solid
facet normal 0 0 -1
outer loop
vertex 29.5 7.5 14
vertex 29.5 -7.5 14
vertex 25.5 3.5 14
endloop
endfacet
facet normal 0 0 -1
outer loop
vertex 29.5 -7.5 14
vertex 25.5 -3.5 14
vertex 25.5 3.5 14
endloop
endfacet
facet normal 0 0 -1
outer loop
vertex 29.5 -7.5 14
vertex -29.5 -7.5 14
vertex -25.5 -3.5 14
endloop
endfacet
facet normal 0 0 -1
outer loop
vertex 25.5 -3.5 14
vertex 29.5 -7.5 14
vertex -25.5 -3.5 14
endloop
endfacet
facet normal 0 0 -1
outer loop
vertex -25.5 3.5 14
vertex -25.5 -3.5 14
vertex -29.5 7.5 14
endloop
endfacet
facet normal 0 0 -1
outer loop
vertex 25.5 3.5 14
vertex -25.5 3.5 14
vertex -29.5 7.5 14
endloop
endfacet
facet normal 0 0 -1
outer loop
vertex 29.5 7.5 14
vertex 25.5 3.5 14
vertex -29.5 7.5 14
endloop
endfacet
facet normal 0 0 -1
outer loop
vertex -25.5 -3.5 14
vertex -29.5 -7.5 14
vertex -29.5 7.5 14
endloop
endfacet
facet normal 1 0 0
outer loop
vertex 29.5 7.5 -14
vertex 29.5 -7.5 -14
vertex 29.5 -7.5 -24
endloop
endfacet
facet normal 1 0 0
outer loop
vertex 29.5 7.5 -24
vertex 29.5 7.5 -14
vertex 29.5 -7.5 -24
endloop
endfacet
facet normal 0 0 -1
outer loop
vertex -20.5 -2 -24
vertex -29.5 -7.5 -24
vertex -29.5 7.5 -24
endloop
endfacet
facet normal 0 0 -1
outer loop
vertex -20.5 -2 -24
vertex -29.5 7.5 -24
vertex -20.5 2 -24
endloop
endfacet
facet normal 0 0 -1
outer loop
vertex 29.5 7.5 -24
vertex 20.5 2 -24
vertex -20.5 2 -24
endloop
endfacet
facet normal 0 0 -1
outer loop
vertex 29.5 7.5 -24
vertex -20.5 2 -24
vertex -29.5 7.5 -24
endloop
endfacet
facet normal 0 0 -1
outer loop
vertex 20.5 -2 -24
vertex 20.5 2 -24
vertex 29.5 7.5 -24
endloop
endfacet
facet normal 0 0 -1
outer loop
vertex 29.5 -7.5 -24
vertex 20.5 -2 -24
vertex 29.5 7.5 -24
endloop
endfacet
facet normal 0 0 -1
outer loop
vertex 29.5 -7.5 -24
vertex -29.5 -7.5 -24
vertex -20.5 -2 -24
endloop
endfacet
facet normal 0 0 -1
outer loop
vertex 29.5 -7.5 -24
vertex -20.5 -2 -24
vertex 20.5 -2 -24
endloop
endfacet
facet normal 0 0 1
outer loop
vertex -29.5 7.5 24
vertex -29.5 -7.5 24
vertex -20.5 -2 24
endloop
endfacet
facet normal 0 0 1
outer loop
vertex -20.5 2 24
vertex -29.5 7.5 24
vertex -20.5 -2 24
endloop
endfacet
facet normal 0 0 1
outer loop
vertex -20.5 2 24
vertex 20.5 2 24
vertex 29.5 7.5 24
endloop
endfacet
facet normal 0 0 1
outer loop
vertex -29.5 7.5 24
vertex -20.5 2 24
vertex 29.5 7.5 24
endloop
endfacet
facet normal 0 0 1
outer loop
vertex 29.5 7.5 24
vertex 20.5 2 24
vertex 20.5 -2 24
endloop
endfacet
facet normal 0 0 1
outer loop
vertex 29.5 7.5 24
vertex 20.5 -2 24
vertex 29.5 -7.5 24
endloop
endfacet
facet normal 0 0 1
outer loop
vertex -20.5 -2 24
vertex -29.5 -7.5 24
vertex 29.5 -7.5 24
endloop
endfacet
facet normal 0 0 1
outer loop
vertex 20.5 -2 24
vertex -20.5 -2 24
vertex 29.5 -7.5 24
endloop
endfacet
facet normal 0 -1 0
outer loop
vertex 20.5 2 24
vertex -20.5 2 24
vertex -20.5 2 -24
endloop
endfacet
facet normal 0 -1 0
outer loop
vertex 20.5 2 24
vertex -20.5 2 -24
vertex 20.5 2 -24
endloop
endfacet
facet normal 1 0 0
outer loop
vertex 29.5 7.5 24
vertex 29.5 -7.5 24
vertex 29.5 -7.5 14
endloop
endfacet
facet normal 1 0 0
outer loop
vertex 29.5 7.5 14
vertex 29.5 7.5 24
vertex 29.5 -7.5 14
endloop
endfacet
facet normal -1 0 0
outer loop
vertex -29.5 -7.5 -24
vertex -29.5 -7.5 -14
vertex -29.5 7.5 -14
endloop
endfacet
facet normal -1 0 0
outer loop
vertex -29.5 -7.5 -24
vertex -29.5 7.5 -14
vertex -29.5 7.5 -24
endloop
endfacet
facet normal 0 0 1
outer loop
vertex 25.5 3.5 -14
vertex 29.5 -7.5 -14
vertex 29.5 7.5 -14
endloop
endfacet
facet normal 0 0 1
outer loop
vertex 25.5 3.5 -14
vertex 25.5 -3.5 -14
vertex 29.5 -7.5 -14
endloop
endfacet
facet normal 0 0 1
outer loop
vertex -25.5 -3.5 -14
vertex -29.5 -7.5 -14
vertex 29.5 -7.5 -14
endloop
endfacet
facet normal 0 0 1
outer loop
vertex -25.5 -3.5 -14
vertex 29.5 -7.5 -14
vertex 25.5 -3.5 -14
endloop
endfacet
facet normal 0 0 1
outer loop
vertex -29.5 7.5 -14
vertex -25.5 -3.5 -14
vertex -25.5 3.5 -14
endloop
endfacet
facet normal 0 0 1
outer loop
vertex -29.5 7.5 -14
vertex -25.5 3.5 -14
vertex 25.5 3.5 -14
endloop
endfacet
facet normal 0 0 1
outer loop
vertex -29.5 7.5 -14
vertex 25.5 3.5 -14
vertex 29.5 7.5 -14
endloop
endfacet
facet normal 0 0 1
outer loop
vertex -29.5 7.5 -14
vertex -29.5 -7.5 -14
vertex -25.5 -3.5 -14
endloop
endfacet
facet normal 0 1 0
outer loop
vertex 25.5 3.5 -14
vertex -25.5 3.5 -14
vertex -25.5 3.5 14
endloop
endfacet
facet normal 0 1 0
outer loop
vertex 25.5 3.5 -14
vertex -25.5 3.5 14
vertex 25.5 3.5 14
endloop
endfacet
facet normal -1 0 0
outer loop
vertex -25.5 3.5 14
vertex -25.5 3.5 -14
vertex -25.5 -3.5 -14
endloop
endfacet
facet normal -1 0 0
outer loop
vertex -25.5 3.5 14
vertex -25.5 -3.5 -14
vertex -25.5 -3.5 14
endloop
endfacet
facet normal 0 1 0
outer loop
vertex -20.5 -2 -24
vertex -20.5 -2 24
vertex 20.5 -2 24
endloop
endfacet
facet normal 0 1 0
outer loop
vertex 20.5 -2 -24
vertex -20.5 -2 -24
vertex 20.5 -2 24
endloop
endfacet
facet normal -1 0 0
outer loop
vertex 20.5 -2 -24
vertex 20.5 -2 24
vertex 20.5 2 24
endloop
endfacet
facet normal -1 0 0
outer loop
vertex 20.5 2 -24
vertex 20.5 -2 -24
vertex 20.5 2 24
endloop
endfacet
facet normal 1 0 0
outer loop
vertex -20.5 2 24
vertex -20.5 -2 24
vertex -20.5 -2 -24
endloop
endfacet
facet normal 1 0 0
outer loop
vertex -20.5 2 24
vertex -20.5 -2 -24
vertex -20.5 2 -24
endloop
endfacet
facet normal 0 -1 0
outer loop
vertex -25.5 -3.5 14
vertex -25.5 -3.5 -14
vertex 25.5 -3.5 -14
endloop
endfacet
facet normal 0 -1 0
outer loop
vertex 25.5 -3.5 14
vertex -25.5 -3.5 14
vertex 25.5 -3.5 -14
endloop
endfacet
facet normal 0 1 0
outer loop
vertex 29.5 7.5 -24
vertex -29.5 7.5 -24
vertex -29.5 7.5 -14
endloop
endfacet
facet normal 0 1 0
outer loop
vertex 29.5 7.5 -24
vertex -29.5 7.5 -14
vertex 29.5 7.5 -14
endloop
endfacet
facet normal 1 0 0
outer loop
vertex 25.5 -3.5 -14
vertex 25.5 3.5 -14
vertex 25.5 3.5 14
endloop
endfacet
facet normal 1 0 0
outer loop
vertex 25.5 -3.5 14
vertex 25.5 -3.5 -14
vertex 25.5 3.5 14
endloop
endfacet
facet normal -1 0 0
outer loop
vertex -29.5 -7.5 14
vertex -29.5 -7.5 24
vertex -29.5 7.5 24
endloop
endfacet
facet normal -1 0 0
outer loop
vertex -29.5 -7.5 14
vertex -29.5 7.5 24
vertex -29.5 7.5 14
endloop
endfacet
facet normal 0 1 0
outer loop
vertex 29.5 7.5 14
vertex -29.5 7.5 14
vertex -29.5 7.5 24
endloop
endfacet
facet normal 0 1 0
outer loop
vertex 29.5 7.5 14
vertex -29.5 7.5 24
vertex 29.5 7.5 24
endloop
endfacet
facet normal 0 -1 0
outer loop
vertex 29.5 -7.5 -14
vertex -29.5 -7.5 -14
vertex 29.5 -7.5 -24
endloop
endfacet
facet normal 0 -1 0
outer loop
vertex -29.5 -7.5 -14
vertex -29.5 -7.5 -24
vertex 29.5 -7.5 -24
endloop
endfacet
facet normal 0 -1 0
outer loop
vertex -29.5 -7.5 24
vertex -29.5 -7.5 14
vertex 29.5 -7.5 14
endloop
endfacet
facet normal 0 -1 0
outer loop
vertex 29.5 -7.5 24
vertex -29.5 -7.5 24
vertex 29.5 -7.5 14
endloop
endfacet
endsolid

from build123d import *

# Parameters (mm, degrees)
BOSS_EXTRUDE1_DEPTH      = 7.5
BOSS_EXTRUDE1_DEPTH_BACK = 7.5
SKETCH1_W                = 59
SKETCH1_H                = 48
SKETCH2_W                = 41
SKETCH2_H                = 4
CUT_EXTRUDE1_DEPTH       = 57.837487629
SKETCH3_W                = 59
SKETCH3_H                = 28
CUT_EXTRUDE2_DEPTH       = 4
SKETCH4_W                = 28
SKETCH4_H                = 11
CUT_EXTRUDE3_DEPTH       = 4


with BuildPart() as part:
    # Sketch1 → Boss-Extrude1 (new, two sides: drawn at the far end of the back side and taken through both)
    with BuildSketch(Plane(origin=(0, 0, 0), x_dir=(1, 0, 0), z_dir=(0, 1, 0)).offset(-BOSS_EXTRUDE1_DEPTH_BACK)):
        Rectangle(SKETCH1_W, SKETCH1_H)
    extrude(amount=BOSS_EXTRUDE1_DEPTH + BOSS_EXTRUDE1_DEPTH_BACK)

    # Sketch2 → Cut-Extrude1 (cut, through all)
    with BuildSketch(Plane.XY.offset(24)):
        Rectangle(SKETCH2_W, SKETCH2_H)
    extrude(amount=-CUT_EXTRUDE1_DEPTH, mode=Mode.SUBTRACT)

    # Sketch3 → Cut-Extrude2 (cut)
    with BuildSketch(Plane(origin=(0, 7.5, 0), x_dir=(1, 0, 0), z_dir=(0, 1, 0))):
        Rectangle(SKETCH3_W, SKETCH3_H)
    cut_extrude2 = extrude(amount=-CUT_EXTRUDE2_DEPTH, mode=Mode.SUBTRACT)

    # Sketch4 → Cut-Extrude3 (cut)
    with BuildSketch(Plane.ZY.offset(29.5)):
        with Locations((0, -2)):
            Rectangle(SKETCH4_W, SKETCH4_H)
    cut_extrude3 = extrude(amount=-CUT_EXTRUDE3_DEPTH, mode=Mode.SUBTRACT)

    # Mirror1: Cut-Extrude3 across plane
    add(cut_extrude3.mirror(Plane(origin=(0, 0, 0), x_dir=(0, 0, 1), z_dir=(1, 0, 0))), mode=Mode.SUBTRACT)

    # Mirror2: Cut-Extrude2 across plane
    add(cut_extrude2.mirror(Plane.ZX), mode=Mode.SUBTRACT)


solid = part.part
